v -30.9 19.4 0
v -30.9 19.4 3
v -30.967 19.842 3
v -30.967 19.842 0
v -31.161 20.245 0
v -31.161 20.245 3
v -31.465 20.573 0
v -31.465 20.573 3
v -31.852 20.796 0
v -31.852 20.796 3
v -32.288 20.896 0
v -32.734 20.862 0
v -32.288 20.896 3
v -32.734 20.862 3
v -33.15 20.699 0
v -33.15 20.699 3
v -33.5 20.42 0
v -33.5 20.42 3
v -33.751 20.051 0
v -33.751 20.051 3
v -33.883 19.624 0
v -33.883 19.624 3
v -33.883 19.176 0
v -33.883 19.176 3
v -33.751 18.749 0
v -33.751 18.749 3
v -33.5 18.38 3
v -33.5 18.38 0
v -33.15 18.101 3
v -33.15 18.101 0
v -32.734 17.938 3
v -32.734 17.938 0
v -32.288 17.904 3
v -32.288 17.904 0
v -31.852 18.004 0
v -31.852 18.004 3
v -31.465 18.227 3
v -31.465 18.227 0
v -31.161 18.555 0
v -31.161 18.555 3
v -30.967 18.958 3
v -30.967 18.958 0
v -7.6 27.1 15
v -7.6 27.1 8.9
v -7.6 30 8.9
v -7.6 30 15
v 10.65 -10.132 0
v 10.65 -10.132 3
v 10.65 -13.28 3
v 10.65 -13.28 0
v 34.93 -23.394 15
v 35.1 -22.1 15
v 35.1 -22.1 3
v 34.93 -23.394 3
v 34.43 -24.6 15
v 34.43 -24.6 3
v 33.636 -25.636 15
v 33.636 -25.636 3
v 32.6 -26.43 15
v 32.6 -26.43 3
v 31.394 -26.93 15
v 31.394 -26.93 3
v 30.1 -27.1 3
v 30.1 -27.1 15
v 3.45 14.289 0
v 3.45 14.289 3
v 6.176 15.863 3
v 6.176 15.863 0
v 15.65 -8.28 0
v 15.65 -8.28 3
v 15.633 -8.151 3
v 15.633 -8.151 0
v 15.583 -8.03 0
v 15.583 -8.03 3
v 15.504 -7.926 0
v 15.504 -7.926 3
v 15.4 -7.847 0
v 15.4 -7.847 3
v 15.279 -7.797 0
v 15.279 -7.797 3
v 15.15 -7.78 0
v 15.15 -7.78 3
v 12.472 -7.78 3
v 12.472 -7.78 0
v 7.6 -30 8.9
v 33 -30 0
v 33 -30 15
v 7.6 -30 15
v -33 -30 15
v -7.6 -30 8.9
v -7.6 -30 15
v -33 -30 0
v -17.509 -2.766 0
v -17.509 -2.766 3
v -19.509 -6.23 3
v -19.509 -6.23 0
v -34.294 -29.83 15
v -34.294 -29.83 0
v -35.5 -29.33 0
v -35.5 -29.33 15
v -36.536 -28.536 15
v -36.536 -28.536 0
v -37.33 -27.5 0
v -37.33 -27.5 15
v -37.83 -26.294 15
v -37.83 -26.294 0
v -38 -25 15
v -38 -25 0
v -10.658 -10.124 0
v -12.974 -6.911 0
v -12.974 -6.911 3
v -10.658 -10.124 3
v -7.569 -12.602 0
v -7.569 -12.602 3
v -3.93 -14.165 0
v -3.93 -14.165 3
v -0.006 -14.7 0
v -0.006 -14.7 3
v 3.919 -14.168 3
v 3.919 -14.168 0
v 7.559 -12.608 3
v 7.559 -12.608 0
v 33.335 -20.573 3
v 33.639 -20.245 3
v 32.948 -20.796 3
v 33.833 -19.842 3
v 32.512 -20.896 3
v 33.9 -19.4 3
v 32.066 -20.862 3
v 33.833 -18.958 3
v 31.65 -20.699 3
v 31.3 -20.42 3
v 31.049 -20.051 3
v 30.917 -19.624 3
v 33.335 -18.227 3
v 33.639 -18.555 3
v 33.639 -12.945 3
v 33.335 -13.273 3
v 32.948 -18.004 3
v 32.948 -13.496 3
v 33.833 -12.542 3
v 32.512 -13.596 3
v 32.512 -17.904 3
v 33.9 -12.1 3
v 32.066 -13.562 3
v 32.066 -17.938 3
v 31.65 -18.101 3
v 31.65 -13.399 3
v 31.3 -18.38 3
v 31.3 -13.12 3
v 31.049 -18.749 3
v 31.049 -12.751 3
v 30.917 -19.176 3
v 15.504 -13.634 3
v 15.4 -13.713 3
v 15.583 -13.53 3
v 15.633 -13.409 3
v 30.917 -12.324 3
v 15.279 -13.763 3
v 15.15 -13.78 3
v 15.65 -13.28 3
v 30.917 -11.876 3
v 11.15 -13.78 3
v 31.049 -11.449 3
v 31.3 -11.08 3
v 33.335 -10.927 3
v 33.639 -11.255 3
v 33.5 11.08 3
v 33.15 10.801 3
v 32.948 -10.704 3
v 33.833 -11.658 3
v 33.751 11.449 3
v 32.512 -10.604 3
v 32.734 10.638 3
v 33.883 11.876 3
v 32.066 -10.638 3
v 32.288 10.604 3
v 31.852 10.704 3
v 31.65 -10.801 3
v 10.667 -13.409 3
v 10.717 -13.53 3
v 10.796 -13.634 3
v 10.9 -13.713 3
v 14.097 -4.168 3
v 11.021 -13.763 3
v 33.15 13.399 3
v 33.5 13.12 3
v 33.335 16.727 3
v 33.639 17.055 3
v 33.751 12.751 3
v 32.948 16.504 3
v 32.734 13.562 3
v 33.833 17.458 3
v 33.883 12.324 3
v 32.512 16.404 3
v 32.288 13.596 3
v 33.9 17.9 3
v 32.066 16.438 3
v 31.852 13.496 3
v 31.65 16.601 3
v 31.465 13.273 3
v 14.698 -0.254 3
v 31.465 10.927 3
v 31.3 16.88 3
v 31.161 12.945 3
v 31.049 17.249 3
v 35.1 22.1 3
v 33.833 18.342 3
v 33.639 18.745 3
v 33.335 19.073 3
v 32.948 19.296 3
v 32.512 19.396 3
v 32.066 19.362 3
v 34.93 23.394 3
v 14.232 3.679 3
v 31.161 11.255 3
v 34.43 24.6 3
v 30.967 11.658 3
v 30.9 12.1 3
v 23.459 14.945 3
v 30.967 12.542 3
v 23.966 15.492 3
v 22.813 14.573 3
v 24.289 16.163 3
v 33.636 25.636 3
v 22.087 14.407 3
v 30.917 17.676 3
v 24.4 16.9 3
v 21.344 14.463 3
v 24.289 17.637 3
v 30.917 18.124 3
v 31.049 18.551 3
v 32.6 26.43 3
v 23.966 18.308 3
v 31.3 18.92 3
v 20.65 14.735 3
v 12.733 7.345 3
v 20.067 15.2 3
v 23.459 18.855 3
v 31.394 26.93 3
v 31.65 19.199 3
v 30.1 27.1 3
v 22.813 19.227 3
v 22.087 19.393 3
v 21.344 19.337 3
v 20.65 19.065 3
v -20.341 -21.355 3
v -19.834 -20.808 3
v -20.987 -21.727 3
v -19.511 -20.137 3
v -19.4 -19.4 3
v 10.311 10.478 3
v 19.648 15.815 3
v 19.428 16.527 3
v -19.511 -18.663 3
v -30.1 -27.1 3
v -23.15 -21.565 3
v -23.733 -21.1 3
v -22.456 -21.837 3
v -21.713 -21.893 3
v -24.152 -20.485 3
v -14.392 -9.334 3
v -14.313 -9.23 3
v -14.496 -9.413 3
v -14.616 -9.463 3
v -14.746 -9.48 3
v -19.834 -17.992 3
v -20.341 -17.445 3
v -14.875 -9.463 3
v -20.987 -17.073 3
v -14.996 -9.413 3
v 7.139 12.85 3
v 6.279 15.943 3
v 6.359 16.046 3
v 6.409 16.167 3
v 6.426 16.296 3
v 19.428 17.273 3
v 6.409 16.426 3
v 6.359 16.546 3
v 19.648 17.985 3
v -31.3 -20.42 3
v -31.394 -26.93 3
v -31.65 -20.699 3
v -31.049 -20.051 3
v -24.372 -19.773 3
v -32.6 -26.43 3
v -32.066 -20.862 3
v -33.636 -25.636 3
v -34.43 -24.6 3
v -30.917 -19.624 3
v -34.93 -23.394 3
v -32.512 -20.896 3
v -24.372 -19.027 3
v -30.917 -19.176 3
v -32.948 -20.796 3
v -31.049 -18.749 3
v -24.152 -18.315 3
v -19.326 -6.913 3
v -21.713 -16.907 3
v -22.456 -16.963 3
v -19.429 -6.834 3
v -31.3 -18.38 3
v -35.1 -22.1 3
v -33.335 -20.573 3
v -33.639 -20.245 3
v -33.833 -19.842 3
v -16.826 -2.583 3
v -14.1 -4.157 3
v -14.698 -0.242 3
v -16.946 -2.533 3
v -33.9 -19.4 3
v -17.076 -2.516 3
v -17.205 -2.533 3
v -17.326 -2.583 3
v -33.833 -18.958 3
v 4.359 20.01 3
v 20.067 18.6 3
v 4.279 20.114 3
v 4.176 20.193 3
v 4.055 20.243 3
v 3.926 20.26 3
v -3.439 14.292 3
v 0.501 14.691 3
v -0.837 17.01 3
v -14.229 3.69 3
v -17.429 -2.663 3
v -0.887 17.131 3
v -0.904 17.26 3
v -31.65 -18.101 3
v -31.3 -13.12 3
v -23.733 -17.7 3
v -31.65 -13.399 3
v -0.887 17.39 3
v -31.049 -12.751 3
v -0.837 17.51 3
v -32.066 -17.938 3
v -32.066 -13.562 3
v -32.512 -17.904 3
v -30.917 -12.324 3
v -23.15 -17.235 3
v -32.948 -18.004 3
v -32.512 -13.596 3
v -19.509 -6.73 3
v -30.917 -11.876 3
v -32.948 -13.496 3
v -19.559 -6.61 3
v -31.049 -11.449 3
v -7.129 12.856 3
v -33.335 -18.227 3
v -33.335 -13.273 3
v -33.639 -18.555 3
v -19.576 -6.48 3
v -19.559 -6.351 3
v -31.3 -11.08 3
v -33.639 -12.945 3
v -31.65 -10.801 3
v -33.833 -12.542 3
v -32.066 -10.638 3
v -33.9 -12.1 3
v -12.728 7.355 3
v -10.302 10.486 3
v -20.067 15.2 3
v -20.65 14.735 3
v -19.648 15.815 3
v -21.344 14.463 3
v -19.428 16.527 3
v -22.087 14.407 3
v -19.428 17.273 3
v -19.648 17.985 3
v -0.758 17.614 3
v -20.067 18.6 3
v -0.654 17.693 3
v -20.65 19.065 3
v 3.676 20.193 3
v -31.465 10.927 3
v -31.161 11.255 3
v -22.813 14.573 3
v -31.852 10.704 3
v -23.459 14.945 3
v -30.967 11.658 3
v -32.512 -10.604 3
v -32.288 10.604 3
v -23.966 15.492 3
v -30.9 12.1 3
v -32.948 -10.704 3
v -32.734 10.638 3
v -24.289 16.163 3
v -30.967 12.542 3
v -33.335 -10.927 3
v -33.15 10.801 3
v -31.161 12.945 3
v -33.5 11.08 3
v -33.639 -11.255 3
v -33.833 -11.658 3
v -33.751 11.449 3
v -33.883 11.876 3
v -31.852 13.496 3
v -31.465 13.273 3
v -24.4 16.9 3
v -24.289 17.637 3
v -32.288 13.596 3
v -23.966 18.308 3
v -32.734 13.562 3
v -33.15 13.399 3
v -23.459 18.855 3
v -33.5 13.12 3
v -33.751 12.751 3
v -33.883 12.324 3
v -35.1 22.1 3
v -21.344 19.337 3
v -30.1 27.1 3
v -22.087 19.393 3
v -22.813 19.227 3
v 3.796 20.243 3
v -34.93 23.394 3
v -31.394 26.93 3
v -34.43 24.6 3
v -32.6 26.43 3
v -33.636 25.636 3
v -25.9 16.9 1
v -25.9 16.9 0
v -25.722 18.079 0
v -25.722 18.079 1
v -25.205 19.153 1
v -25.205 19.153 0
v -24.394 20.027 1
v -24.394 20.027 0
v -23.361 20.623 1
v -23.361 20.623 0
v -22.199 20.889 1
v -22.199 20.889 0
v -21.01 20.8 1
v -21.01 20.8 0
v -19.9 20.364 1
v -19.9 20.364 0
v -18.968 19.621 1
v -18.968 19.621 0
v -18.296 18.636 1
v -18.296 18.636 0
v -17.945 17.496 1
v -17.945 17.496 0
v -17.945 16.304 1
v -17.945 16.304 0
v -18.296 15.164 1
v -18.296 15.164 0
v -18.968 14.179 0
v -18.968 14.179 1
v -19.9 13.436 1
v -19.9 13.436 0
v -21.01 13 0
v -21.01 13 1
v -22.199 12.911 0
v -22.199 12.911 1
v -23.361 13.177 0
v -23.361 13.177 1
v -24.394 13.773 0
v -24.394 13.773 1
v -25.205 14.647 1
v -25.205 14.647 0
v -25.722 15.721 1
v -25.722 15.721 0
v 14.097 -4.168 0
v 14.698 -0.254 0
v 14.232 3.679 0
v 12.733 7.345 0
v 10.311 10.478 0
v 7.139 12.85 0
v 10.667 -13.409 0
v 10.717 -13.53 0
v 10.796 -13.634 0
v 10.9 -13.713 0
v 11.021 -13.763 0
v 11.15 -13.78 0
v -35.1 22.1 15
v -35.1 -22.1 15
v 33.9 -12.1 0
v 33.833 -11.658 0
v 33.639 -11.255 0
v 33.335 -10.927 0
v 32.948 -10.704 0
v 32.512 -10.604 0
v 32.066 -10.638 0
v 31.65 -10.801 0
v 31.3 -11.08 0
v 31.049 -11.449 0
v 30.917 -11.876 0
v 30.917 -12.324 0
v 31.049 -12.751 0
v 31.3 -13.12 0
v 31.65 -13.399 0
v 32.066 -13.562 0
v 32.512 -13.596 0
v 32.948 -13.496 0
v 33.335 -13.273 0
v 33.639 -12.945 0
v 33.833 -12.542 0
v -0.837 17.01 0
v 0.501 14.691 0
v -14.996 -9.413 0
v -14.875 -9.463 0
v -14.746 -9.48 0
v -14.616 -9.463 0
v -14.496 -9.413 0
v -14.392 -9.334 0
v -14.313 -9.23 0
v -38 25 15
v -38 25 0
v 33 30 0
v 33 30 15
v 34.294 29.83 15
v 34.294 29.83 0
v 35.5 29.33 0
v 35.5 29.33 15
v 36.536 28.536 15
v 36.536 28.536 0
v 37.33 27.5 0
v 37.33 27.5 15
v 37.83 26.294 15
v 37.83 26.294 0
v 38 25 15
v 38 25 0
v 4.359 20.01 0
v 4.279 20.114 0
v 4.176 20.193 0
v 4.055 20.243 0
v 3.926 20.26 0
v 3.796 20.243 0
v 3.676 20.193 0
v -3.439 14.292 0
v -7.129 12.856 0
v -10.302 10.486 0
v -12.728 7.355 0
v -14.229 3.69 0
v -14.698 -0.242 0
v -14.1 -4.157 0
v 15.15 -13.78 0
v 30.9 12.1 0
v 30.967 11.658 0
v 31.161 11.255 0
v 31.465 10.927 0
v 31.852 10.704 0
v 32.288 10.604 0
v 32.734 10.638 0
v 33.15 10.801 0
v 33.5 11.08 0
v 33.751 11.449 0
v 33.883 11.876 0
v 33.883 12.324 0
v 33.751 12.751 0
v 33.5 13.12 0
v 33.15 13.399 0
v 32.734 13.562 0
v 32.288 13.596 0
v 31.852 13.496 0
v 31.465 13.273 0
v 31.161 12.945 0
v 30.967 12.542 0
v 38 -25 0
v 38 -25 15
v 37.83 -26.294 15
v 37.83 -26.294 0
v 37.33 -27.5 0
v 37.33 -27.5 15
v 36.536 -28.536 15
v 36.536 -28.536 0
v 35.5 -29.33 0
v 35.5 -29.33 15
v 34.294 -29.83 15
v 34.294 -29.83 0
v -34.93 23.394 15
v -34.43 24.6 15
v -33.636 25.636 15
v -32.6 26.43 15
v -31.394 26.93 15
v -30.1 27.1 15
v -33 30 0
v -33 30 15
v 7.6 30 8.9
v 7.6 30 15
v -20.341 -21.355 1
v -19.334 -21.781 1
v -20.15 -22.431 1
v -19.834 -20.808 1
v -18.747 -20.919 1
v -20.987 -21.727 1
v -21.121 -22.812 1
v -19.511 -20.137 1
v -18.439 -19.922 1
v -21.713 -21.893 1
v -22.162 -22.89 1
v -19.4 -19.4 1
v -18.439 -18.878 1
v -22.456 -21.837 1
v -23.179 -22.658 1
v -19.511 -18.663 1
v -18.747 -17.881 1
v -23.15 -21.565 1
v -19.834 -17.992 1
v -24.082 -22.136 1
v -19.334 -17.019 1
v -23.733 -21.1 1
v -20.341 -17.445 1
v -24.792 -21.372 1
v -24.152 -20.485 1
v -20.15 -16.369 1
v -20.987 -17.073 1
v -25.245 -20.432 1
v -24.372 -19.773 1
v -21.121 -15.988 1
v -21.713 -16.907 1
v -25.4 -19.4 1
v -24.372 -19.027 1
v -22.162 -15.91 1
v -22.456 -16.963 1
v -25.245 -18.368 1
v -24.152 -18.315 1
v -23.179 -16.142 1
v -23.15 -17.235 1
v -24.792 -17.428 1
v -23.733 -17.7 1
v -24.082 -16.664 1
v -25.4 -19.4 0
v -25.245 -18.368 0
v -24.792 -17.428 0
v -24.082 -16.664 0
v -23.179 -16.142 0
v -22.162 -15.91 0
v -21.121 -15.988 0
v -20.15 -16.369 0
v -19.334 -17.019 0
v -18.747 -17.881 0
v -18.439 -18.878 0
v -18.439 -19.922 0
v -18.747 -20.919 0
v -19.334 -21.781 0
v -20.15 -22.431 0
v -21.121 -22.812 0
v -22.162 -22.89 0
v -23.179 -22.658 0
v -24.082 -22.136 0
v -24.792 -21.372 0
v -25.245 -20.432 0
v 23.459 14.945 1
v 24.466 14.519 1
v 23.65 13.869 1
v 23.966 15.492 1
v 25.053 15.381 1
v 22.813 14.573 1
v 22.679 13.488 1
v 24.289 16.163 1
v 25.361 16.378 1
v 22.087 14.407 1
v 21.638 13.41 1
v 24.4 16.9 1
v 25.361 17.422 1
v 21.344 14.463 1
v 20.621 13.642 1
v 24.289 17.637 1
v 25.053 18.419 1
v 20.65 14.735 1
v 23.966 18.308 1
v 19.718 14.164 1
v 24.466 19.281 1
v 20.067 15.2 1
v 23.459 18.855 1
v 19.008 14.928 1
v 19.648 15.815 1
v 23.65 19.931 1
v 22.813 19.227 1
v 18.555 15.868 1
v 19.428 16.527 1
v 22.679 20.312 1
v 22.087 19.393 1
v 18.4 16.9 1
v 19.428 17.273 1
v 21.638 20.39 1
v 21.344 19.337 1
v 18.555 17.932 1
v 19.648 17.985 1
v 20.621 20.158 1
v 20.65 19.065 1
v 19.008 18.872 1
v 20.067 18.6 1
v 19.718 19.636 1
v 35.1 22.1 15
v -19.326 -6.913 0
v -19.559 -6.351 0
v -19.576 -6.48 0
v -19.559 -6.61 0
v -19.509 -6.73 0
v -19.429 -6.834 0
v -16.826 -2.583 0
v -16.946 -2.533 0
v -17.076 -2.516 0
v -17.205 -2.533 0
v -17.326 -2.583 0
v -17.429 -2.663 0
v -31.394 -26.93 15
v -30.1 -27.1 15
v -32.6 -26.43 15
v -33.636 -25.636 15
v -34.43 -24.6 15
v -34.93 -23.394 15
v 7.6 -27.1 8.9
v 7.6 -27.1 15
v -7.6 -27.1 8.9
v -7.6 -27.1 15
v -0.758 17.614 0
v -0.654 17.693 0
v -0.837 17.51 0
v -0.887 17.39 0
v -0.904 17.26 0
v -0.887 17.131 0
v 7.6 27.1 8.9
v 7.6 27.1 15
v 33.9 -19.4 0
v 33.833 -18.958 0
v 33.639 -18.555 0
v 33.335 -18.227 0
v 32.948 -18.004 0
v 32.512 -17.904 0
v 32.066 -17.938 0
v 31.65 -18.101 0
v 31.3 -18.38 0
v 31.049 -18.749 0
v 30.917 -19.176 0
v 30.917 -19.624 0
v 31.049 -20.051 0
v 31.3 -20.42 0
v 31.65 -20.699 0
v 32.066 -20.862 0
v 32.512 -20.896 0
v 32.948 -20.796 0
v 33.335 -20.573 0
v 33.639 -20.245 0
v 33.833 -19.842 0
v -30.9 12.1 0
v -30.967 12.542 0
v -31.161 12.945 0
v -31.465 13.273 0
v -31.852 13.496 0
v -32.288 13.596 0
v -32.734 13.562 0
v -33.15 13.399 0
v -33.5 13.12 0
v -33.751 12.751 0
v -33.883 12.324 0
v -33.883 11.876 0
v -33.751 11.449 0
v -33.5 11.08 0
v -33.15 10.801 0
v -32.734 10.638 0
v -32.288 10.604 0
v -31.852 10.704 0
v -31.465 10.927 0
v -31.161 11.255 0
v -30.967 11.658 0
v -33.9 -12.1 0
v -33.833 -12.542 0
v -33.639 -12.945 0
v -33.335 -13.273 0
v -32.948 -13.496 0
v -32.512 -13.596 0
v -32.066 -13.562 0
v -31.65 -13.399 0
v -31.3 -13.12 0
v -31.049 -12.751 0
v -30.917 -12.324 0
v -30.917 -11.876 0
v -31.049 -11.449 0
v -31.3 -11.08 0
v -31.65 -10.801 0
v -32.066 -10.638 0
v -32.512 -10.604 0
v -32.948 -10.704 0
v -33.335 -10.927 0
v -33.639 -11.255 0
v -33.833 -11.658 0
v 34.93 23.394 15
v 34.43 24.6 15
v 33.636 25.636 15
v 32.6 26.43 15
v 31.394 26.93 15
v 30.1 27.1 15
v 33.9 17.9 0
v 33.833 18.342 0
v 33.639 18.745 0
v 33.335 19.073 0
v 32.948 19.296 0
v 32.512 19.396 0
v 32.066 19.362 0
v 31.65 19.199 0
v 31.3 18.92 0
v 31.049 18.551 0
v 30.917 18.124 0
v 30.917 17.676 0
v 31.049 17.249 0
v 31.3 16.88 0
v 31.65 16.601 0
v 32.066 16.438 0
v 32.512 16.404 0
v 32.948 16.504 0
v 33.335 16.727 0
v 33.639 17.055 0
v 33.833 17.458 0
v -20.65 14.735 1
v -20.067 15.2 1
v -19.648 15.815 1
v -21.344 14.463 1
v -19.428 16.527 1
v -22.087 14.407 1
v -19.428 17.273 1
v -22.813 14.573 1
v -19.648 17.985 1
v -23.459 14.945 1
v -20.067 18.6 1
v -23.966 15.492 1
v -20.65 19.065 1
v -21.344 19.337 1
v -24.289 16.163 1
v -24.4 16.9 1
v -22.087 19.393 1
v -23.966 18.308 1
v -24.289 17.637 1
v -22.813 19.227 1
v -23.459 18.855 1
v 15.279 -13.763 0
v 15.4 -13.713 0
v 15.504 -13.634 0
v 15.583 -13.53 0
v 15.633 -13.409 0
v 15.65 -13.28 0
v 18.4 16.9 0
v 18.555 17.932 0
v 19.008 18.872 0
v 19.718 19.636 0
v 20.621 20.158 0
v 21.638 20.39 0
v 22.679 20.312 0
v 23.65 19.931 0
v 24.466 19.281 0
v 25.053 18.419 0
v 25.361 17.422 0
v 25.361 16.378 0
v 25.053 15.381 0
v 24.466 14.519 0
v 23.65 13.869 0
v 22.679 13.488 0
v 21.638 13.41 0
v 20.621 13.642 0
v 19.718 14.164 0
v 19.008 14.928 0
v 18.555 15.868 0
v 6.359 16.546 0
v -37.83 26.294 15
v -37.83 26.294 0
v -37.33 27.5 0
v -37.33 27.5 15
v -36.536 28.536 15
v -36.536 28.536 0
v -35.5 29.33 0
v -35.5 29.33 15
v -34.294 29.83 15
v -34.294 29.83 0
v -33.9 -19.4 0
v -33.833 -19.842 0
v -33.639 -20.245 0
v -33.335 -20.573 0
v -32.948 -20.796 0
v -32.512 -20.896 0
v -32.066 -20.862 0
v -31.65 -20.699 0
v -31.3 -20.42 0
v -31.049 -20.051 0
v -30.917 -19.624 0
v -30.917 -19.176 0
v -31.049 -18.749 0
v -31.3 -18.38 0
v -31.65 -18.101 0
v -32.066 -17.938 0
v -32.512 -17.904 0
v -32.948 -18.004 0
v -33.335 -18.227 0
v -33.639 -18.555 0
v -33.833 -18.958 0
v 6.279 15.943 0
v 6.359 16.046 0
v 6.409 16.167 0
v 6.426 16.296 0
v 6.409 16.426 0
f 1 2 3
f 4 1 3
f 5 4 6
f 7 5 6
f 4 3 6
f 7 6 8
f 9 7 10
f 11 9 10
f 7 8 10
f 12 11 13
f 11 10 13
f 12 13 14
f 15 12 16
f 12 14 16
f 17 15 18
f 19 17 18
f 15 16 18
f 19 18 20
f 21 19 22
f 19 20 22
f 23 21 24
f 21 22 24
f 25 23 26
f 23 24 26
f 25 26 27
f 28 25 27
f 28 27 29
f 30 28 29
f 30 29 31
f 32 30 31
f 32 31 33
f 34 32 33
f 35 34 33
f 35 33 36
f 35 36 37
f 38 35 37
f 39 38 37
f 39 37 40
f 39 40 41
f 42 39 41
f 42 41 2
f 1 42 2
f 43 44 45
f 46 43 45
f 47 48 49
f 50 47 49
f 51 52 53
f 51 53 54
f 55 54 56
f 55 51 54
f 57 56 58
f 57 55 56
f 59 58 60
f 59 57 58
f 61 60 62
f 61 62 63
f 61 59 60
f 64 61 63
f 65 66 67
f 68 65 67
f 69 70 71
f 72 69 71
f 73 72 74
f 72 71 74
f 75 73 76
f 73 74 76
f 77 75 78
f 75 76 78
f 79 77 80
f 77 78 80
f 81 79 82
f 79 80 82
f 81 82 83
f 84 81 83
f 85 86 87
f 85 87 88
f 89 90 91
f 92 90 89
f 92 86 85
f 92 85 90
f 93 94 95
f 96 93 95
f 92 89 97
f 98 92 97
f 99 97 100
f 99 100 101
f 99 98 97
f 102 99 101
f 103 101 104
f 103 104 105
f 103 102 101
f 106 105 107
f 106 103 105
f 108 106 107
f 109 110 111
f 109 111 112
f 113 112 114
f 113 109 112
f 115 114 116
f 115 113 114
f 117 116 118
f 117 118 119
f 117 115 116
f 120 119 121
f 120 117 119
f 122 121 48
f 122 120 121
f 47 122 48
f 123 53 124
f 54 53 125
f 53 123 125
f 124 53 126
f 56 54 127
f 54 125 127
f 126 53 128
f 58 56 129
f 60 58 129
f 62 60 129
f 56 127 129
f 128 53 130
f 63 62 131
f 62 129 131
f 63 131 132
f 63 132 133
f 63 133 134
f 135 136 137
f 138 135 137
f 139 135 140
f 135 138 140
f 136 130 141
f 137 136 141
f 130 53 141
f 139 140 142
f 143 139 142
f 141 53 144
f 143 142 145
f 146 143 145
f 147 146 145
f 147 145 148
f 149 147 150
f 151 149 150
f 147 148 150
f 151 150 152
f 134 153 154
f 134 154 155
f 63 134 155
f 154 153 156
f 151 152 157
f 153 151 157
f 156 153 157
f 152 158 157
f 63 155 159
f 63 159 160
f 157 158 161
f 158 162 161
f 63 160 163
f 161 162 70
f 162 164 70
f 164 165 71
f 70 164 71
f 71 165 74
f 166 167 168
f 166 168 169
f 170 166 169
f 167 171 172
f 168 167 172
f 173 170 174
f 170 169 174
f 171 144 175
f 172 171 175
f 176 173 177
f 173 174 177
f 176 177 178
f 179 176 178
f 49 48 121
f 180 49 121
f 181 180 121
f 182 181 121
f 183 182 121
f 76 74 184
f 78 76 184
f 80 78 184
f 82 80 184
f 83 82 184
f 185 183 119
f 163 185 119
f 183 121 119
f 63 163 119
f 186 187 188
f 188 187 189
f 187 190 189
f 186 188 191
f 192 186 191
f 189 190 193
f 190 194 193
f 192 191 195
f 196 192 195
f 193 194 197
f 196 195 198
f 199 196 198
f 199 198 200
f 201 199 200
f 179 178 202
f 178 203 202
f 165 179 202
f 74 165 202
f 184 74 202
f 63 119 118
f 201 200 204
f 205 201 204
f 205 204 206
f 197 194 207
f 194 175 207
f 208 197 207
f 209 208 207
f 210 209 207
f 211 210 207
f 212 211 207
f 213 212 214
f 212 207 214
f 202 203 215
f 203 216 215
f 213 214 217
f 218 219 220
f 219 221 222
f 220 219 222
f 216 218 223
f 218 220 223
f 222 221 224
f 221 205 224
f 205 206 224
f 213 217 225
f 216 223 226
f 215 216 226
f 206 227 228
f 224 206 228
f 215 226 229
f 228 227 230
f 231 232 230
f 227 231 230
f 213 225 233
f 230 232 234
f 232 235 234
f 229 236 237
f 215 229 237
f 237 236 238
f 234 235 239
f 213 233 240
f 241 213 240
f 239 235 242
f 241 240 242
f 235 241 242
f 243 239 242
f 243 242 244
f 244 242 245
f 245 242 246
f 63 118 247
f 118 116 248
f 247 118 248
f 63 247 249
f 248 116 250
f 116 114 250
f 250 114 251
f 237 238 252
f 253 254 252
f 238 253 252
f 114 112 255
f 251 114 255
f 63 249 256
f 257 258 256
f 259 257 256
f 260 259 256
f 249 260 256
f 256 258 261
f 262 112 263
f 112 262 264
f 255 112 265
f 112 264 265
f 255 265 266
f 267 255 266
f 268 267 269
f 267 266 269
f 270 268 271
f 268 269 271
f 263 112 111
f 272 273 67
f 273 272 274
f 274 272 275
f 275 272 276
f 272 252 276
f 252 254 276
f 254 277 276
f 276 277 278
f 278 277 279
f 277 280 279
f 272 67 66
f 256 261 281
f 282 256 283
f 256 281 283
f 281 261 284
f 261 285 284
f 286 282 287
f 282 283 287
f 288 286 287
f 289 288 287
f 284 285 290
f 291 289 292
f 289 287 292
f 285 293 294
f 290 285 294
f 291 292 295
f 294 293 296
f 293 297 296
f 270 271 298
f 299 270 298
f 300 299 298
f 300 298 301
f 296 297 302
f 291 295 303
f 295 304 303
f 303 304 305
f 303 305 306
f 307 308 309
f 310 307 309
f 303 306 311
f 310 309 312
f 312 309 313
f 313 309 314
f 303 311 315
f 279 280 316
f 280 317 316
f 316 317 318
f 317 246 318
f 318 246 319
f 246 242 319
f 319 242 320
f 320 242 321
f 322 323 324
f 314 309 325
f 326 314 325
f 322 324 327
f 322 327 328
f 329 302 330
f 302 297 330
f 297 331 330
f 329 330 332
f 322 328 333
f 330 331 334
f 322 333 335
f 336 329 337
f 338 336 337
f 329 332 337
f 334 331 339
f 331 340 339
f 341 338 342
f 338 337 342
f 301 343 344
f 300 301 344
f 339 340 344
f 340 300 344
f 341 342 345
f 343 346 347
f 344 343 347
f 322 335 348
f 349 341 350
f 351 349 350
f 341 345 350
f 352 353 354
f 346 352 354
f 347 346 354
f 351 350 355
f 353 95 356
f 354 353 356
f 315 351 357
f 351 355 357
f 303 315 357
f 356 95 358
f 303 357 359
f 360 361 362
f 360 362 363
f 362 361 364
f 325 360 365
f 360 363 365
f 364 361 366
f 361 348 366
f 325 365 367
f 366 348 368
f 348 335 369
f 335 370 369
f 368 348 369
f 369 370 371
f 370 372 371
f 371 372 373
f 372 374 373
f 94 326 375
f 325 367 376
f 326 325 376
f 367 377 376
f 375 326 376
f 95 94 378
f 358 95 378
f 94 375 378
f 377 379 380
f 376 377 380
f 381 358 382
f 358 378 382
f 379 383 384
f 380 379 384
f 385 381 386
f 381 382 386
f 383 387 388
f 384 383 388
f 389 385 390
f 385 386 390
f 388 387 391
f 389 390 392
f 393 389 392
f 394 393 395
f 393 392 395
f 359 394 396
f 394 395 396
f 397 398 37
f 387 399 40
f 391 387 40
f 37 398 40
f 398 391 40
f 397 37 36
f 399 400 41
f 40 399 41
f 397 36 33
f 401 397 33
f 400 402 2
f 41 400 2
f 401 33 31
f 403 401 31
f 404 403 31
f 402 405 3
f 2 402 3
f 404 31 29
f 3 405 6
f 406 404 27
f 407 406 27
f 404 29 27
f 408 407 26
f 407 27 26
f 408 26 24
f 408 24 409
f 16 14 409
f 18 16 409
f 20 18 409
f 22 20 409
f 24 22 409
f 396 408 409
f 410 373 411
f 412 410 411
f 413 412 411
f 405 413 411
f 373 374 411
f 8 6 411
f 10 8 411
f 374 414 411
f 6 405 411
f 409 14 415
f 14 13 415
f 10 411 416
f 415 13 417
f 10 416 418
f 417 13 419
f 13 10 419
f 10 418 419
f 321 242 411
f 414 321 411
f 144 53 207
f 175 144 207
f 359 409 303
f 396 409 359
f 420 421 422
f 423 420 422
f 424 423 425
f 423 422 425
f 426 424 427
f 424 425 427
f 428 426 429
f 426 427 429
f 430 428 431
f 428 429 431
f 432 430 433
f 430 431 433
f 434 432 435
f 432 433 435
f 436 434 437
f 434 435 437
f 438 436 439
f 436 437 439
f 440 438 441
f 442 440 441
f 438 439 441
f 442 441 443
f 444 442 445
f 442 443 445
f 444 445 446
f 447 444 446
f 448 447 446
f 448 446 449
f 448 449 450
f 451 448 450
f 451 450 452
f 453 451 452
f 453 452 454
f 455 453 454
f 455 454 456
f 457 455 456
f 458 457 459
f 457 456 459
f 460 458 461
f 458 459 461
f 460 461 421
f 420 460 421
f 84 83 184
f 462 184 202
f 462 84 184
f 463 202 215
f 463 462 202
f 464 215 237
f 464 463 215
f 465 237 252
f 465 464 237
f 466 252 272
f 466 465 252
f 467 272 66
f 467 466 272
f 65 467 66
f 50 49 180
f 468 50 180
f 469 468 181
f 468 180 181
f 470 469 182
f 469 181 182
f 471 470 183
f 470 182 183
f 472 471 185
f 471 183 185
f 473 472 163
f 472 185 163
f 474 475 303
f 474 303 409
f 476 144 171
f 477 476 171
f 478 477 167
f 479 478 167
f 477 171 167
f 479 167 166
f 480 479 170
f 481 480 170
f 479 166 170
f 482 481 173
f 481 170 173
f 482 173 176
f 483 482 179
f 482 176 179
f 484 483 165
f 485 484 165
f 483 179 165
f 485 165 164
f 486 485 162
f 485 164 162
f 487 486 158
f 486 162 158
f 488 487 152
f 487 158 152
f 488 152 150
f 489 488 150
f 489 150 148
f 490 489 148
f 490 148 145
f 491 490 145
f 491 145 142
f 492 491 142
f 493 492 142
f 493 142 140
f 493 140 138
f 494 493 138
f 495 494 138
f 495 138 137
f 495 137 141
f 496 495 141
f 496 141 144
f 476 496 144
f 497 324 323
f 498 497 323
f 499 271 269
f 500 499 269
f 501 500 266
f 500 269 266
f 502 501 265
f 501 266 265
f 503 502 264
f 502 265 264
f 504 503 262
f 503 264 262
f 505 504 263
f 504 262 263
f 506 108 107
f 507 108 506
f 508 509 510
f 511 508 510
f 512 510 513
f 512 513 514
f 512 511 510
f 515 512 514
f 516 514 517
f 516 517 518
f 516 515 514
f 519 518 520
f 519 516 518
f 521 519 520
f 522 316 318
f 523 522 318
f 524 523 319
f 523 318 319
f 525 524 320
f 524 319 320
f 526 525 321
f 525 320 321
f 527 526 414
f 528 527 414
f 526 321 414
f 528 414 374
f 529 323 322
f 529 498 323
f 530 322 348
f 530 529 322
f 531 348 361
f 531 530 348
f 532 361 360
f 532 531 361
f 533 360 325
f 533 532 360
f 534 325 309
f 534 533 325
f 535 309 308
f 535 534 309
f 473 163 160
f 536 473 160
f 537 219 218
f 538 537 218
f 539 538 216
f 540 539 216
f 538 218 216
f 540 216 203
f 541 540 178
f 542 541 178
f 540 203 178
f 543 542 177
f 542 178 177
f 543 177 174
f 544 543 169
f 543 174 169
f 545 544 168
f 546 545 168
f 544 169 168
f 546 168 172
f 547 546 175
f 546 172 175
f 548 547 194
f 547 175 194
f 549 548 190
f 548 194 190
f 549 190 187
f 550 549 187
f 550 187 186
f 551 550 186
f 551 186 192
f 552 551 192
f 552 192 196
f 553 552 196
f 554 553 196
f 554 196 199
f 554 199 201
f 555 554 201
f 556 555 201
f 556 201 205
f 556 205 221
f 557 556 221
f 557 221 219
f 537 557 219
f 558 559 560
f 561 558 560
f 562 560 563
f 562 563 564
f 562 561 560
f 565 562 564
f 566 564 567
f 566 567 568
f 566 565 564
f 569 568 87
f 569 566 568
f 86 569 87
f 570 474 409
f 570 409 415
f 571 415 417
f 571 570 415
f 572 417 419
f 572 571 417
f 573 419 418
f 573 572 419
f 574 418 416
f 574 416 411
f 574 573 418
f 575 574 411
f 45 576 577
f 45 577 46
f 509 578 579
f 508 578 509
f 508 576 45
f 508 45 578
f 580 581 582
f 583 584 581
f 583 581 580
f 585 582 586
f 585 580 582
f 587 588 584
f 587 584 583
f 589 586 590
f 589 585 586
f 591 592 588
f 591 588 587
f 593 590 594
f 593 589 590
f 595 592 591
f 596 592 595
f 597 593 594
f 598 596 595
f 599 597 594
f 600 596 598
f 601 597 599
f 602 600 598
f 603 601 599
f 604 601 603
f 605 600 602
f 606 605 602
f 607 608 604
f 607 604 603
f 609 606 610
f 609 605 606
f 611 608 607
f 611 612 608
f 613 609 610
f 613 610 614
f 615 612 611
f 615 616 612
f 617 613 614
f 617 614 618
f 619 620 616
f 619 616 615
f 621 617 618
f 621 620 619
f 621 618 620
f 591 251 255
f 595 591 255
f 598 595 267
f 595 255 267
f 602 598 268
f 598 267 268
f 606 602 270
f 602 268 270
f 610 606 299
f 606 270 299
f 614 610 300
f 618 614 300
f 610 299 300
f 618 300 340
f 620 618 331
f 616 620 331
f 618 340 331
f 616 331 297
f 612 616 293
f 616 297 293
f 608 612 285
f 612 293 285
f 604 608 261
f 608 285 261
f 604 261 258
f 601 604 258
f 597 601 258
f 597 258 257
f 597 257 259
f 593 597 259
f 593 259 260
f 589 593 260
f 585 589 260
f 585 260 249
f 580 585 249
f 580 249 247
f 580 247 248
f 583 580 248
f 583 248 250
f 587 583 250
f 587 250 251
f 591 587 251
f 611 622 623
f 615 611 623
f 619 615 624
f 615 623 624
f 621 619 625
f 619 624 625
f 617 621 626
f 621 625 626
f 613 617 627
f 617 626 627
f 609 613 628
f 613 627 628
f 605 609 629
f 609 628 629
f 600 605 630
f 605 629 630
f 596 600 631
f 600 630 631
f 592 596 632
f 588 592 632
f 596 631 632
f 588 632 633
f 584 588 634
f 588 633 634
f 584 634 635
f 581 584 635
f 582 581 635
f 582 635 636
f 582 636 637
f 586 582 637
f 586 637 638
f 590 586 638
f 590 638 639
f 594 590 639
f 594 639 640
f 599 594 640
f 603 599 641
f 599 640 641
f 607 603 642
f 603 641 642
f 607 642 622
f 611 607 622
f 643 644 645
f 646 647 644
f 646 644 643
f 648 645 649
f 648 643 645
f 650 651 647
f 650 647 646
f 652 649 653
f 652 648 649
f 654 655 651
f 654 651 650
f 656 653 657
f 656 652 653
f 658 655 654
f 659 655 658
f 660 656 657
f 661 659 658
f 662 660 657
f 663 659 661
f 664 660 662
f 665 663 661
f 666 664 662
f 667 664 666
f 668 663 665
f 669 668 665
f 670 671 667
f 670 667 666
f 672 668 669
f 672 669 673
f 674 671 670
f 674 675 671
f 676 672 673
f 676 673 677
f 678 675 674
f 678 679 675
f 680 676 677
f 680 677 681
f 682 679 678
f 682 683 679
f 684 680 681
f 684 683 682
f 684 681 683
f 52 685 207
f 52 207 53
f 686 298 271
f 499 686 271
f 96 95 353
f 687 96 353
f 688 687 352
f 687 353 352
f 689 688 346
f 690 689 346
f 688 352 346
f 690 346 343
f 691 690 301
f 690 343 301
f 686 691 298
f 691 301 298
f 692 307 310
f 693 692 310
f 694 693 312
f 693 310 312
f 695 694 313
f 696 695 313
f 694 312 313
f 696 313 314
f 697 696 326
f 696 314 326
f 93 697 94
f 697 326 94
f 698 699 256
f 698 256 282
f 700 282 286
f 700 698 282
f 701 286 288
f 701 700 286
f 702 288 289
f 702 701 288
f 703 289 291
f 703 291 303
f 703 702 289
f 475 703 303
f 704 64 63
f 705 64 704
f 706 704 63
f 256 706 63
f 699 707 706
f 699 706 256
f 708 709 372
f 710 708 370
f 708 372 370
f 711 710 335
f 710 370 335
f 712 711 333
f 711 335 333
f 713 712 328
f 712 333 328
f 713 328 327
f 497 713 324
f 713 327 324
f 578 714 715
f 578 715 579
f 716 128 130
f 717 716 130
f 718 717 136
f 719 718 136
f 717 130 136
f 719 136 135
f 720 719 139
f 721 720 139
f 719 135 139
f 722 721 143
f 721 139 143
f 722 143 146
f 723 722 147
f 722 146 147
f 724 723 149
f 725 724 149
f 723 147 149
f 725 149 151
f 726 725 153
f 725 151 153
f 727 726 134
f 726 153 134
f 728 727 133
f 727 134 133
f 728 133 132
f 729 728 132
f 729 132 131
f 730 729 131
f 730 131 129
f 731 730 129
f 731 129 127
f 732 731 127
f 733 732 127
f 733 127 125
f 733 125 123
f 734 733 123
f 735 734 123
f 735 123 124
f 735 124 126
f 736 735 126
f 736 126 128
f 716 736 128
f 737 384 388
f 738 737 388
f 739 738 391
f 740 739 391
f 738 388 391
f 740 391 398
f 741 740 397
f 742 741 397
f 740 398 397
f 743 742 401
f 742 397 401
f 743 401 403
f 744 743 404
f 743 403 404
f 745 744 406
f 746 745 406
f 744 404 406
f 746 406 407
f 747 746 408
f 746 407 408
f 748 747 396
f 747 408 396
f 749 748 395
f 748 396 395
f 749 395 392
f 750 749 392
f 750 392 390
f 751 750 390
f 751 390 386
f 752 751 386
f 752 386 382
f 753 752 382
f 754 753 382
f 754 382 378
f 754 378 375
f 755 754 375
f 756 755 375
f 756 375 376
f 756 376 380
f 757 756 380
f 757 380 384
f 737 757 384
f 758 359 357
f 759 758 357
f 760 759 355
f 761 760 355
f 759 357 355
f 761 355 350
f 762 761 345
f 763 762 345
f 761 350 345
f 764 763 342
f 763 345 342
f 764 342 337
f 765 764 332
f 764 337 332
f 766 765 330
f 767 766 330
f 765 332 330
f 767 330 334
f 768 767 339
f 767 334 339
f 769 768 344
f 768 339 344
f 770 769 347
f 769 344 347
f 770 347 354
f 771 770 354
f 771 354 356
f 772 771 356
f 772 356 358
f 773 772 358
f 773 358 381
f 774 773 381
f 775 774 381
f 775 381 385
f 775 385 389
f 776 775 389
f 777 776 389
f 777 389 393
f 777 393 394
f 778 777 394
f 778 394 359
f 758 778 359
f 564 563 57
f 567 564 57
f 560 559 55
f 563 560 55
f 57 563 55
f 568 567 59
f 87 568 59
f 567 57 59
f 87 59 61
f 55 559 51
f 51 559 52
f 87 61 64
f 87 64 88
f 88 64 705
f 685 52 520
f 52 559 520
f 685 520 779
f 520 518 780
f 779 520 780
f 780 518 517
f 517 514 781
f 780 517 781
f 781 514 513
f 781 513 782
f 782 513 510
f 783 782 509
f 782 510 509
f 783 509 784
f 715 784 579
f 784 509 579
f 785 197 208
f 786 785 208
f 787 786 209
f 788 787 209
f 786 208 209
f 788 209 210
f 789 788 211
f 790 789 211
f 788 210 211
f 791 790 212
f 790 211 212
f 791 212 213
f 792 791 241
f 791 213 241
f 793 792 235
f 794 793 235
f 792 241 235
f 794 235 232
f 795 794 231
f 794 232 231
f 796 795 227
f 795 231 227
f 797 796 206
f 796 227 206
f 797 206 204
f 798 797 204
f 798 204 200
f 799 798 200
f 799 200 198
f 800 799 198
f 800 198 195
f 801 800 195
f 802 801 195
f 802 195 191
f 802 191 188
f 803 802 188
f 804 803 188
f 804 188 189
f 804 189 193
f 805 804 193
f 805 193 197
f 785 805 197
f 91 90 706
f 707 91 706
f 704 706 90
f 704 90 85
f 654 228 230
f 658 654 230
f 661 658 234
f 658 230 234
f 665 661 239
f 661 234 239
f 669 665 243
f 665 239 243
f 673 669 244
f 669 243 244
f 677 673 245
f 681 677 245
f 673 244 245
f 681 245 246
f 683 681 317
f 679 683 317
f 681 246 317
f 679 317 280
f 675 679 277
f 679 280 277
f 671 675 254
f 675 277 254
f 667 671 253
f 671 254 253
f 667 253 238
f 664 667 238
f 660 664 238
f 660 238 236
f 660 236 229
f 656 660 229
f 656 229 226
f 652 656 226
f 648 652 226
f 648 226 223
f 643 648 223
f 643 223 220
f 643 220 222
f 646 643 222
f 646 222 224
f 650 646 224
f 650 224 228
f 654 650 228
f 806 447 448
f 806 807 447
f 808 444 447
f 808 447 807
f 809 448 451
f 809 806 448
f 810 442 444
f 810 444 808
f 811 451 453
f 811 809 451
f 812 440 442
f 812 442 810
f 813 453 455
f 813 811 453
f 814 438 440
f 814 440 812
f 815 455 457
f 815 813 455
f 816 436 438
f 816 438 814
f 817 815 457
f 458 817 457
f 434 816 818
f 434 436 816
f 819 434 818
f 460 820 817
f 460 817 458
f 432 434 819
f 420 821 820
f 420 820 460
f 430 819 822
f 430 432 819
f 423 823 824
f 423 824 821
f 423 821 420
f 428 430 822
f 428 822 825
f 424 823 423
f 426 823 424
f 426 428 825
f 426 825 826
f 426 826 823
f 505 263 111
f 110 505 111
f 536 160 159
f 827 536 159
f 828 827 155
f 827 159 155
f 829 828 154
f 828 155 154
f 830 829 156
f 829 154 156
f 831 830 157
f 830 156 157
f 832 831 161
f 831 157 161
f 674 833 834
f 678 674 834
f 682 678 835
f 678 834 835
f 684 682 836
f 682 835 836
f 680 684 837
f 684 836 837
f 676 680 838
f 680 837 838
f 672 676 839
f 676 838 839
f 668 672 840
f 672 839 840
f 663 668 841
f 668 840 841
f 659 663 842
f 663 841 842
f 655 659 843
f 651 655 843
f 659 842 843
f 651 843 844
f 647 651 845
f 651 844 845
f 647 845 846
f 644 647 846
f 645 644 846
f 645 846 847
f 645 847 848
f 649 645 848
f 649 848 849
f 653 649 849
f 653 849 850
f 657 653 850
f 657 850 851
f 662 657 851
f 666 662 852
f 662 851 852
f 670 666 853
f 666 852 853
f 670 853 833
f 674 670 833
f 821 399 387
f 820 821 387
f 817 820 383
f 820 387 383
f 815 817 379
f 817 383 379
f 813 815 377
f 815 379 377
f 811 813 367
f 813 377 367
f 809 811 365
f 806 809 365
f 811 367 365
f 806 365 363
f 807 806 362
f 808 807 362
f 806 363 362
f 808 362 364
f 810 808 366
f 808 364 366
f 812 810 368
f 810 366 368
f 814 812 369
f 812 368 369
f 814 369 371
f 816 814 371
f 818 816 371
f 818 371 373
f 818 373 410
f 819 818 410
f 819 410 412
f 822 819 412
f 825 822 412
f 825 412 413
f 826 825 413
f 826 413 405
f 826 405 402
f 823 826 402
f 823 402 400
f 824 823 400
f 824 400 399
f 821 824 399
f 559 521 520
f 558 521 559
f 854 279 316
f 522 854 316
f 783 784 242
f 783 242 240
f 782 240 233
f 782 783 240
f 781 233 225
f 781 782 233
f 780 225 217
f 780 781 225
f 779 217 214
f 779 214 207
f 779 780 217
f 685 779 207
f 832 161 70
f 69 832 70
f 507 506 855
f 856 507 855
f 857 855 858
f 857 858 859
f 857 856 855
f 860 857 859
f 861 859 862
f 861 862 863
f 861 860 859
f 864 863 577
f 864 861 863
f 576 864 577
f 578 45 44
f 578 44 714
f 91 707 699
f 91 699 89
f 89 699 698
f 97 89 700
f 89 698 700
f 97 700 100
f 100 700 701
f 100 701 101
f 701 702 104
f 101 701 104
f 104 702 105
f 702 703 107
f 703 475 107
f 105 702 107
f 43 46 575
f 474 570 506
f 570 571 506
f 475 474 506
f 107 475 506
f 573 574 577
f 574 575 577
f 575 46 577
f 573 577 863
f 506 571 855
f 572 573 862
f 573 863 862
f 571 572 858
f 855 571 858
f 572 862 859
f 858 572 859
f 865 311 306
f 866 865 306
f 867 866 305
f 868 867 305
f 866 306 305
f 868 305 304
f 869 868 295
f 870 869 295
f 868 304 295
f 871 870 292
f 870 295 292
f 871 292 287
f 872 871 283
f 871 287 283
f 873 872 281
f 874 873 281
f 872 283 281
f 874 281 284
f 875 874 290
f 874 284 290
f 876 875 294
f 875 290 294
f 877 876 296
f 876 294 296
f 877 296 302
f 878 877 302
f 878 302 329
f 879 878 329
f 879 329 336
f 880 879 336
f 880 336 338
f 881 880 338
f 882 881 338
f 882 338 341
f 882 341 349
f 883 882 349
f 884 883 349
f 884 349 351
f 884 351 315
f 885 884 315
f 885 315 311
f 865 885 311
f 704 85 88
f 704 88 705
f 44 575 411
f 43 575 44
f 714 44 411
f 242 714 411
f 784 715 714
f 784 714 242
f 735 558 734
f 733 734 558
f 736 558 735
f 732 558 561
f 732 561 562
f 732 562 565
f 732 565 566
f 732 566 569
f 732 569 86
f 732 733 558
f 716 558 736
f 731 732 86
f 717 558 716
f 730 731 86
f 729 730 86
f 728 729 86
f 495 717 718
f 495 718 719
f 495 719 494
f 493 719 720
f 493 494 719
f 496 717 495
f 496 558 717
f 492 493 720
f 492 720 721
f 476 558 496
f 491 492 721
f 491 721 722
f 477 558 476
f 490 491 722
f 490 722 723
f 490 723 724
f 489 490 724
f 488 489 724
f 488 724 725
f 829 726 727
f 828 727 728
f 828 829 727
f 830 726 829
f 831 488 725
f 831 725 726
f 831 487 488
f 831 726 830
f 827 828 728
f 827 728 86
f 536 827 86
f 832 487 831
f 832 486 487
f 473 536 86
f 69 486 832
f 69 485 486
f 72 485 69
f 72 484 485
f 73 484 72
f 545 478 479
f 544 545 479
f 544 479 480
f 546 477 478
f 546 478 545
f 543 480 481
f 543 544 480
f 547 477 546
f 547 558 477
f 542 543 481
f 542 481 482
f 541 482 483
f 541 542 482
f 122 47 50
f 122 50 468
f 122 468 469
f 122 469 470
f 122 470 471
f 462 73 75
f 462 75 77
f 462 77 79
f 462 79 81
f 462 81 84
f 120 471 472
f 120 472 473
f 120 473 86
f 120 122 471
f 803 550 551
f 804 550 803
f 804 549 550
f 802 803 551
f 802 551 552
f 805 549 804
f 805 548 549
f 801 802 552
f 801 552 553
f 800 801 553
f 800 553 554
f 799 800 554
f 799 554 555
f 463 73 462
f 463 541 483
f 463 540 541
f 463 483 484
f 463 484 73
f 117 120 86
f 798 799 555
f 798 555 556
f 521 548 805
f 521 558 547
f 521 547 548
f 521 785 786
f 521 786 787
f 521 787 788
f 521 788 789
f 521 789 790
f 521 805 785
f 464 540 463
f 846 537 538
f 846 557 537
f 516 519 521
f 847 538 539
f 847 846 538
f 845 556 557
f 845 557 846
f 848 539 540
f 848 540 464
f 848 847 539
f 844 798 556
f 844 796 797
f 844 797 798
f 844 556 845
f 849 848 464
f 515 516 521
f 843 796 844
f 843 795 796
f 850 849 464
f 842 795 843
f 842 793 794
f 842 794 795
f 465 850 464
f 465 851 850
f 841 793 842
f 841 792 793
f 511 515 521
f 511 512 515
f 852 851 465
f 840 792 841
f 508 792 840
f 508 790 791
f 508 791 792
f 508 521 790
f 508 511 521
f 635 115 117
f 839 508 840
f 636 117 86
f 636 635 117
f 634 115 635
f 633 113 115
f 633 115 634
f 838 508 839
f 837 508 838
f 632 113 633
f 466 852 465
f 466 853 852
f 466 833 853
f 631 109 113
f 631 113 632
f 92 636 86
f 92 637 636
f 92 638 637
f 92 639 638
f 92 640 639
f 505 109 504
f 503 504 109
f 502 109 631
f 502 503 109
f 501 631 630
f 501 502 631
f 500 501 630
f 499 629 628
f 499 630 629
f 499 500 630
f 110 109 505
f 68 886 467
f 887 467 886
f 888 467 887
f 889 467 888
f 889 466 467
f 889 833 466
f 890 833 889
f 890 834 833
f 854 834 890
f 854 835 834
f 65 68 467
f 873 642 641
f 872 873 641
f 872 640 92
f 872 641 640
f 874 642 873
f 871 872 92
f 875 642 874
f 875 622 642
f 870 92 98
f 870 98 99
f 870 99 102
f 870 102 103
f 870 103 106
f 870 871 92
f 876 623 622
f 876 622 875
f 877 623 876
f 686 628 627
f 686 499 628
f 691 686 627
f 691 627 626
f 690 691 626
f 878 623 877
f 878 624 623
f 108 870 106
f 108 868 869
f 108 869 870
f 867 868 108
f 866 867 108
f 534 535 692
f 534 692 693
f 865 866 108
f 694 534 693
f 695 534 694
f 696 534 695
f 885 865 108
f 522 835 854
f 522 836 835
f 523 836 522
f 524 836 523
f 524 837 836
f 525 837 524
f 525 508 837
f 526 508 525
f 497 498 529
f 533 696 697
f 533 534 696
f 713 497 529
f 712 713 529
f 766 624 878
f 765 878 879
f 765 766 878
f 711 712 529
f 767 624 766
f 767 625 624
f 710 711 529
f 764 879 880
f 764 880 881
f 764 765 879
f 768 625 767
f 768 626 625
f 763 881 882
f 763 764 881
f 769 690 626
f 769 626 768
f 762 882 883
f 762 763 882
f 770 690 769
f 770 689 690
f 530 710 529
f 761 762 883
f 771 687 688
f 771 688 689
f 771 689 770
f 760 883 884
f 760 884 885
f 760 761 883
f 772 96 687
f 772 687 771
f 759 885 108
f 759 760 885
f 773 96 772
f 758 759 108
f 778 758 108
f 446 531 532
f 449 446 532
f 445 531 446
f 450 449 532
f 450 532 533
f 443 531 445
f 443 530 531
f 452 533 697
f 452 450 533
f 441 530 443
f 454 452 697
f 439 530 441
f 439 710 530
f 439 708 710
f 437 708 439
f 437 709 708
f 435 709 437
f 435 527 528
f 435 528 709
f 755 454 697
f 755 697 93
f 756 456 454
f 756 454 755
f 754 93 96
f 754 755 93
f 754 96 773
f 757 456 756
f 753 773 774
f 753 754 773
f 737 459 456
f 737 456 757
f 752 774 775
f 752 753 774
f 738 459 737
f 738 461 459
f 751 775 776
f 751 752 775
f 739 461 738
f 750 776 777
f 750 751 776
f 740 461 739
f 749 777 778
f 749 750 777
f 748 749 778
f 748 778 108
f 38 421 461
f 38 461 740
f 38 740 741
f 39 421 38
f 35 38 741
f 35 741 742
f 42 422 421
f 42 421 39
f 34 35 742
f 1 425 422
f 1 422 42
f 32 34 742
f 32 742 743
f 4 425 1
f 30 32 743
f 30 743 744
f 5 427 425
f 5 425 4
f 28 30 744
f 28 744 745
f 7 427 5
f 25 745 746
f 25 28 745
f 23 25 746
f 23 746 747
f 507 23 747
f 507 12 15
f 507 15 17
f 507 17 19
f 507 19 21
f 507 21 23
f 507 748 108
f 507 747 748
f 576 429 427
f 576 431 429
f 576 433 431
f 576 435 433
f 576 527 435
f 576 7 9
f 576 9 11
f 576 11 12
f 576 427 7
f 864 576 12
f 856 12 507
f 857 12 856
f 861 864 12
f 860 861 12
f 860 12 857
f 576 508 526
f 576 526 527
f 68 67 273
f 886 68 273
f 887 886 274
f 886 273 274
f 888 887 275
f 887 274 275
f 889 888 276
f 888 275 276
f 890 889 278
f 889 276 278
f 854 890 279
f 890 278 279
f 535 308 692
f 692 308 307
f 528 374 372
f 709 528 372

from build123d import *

# Parameters (mm, degrees)
EXTRUDE_1_DEPTH     = 15
CUT_EXTRUDE_1_DEPTH = 12
SKETCH_4_W          = 15.2
SKETCH_4_H          = 2.9
CUT_EXTRUDE_2_DEPTH = 6.1
SKETCH_5_R          = 1.5
CUT_EXTRUDE_3_DEPTH = 50.879855653
SKETCH_8_R          = 2.5
CUT_EXTRUDE_4_DEPTH = 50.879855653
SKETCH_9_R          = 3.5
SKETCH_9_R_2        = 4
CUT_EXTRUDE_6_DEPTH = 1


with BuildPart() as part:
    # 草圖1 → 填料-伸長1 (new body)
    with BuildSketch(Plane.XY):
        with BuildLine():
            Line((-33, 30), (33, 30))
            ThreePointArc((33, 30), (36.535533906, 28.535533906), (38, 25))
            Line((38, 25), (38, -25))
            ThreePointArc((38, -25), (36.535533906, -28.535533906), (33, -30))
            Line((33, -30), (-33, -30))
            ThreePointArc((-33, -30), (-36.535533906, -28.535533906), (-38, -25))
            Line((-38, -25), (-38, 25))
            ThreePointArc((-38, 25), (-36.535533906, 28.535533906), (-33, 30))
        make_face()
    extrude(amount=EXTRUDE_1_DEPTH)

    # 草圖2 → 除料-伸長1 (cut)
    with BuildSketch(Plane.XY.offset(15)):
        with BuildLine():
            Line((-30.1, 27.1), (30.1, 27.1))
            ThreePointArc((30.1, 27.1), (33.635533906, 25.635533906), (35.1, 22.1))
            Line((35.1, 22.1), (35.1, -22.1))
            ThreePointArc((35.1, -22.1), (33.635533906, -25.635533906), (30.1, -27.1))
            Line((30.1, -27.1), (-30.1, -27.1))
            ThreePointArc((-30.1, -27.1), (-33.635533906, -25.635533906), (-35.1, -22.1))
            Line((-35.1, -22.1), (-35.1, 22.1))
            ThreePointArc((-35.1, 22.1), (-33.635533906, 25.635533906), (-30.1, 27.1))
        make_face()
    extrude(amount=-CUT_EXTRUDE_1_DEPTH, mode=Mode.SUBTRACT)

    # 草圖3 → 除料-旋轉1 (revolve, cut)
    with BuildSketch(Plane(origin=(0, 0, 0), x_dir=(1, 0, 0), z_dir=(0, 1, 0)), mode=Mode.PRIVATE) as cut_revolve_1_sk:
        Polygon((0, -3), (14.7, -3), (14.7, -1.9), (14.7, 0), (0, 0), (0, -1.9), align=None)
    revolve(cut_revolve_1_sk.sketch.rotate(Axis((0, 0, -11.605627028), (0, 0, 1)), 180), axis=Axis((0, 0, -11.605627028), (0, 0, 1)), mode=Mode.SUBTRACT)

    # 草圖4 → 除料-伸長2 (cut)
    with BuildSketch(Plane.XY.offset(15)):
        with Locations((0, 28.55)):
            Rectangle(SKETCH_4_W, SKETCH_4_H)
        with Locations((0, -28.55)):
            Rectangle(SKETCH_4_W, SKETCH_4_H)
    extrude(amount=-CUT_EXTRUDE_2_DEPTH, mode=Mode.SUBTRACT)

    # 草圖5 → 除料-伸長3 (cut, through all)
    with BuildSketch(Plane.XY.offset(3)):
        with BuildLine():
            ThreePointArc((-0.654309657, 17.693297569), (-0.88727257, 17.38969439), (-0.837322359, 17.010284867))
            Line((-0.837322359, 17.010284867), (1.162677641, 13.546183252))
            ThreePointArc((1.162677641, 13.546183252), (1.725099866, 14.279146165), (1.845690343, 13.36317055))
            Line((1.845690343, 13.36317055), (6.175817362, 15.86317055))
            ThreePointArc((6.175817362, 15.86317055), (6.408780275, 16.16677373), (6.358830064, 16.546183252))
            Line((6.358830064, 16.546183252), (4.358830064, 20.010284867))
            ThreePointArc((4.358830064, 20.010284867), (4.055226885, 20.24324778), (3.675817362, 20.193297569))
            Line((3.675817362, 20.193297569), (-0.654309657, 17.693297569))
        make_face()
        with BuildLine():
            Line((-14.312677641, -9.230284867), (-12.312677641, -5.766183252))
            ThreePointArc((-12.312677641, -5.766183252), (-13.228653256, -5.645592775), (-12.495690343, -5.08317055))
            Line((-12.495690343, -5.08317055), (-16.825817362, -2.58317055))
            ThreePointArc((-16.825817362, -2.58317055), (-17.205226885, -2.533220339), (-17.508830064, -2.766183252))
            Line((-17.508830064, -2.766183252), (-19.508830064, -6.230284867))
            ThreePointArc((-19.508830064, -6.230284867), (-19.558780275, -6.60969439), (-19.325817362, -6.913297569))
            Line((-19.325817362, -6.913297569), (-14.995690343, -9.413297569))
            ThreePointArc((-14.995690343, -9.413297569), (-14.616280821, -9.46324778), (-14.312677641, -9.230284867))
        make_face()
        with BuildLine():
            Line((15.15, -7.78), (11.15, -7.78))
            ThreePointArc((11.15, -7.78), (10.796446609, -7.926446609), (10.65, -8.28))
            Line((10.65, -8.28), (10.65, -13.28))
            ThreePointArc((10.65, -13.28), (10.796446609, -13.633553391), (11.15, -13.78))
            Line((11.15, -13.78), (15.15, -13.78))
            ThreePointArc((15.15, -13.78), (15.503553391, -13.633553391), (15.65, -13.28))
            Line((15.65, -13.28), (15.65, -8.28))
            ThreePointArc((15.65, -8.28), (15.503553391, -7.926446609), (15.15, -7.78))
        make_face()
        with Locations((-32.4, 19.4)):
            Circle(SKETCH_5_R)
        with Locations((32.4, 17.9)):
            Circle(SKETCH_5_R)
        with Locations(Location((-32.4, -19.4, 0), (0, 0, 180))):
            Circle(SKETCH_5_R)
        with Locations((32.4, -19.4)):
            Circle(SKETCH_5_R)
        with Locations((-32.4, 12.1)):
            Circle(SKETCH_5_R)
        with Locations(Location((32.4, 12.1, 0), (0, 0, 180))):
            Circle(SKETCH_5_R)
        with Locations((32.4, -12.1)):
            Circle(SKETCH_5_R)
        with Locations(Location((-32.4, -12.1, 0), (0, 0, 180))):
            Circle(SKETCH_5_R)
    extrude(amount=-CUT_EXTRUDE_3_DEPTH, mode=Mode.SUBTRACT)

    # 草圖8 → 除料-伸長4 (cut, through all)
    with BuildSketch(Plane.XY.offset(3)):
        with Locations((-21.9, -19.4)):
            Circle(SKETCH_8_R)
        with Locations((21.9, 16.9)):
            Circle(SKETCH_8_R)
        with Locations(Location((-21.9, 16.9, 0), (0, 0, 180))):
            Circle(SKETCH_8_R)
    extrude(amount=-CUT_EXTRUDE_4_DEPTH, mode=Mode.SUBTRACT)

    # 草圖9 → 除料-伸長6 (cut)
    with BuildSketch(Plane(origin=(0, 0, 0), x_dir=(-1, 0, 0), z_dir=(0, 0, -1))):
        with Locations((-21.9, 16.9)):
            Circle(SKETCH_9_R)
        with Locations((21.9, -19.4)):
            Circle(SKETCH_9_R)
        with Locations((21.9, 16.9)):
            Circle(SKETCH_9_R_2)
    extrude(amount=-CUT_EXTRUDE_6_DEPTH, mode=Mode.SUBTRACT)


solid = part.part
